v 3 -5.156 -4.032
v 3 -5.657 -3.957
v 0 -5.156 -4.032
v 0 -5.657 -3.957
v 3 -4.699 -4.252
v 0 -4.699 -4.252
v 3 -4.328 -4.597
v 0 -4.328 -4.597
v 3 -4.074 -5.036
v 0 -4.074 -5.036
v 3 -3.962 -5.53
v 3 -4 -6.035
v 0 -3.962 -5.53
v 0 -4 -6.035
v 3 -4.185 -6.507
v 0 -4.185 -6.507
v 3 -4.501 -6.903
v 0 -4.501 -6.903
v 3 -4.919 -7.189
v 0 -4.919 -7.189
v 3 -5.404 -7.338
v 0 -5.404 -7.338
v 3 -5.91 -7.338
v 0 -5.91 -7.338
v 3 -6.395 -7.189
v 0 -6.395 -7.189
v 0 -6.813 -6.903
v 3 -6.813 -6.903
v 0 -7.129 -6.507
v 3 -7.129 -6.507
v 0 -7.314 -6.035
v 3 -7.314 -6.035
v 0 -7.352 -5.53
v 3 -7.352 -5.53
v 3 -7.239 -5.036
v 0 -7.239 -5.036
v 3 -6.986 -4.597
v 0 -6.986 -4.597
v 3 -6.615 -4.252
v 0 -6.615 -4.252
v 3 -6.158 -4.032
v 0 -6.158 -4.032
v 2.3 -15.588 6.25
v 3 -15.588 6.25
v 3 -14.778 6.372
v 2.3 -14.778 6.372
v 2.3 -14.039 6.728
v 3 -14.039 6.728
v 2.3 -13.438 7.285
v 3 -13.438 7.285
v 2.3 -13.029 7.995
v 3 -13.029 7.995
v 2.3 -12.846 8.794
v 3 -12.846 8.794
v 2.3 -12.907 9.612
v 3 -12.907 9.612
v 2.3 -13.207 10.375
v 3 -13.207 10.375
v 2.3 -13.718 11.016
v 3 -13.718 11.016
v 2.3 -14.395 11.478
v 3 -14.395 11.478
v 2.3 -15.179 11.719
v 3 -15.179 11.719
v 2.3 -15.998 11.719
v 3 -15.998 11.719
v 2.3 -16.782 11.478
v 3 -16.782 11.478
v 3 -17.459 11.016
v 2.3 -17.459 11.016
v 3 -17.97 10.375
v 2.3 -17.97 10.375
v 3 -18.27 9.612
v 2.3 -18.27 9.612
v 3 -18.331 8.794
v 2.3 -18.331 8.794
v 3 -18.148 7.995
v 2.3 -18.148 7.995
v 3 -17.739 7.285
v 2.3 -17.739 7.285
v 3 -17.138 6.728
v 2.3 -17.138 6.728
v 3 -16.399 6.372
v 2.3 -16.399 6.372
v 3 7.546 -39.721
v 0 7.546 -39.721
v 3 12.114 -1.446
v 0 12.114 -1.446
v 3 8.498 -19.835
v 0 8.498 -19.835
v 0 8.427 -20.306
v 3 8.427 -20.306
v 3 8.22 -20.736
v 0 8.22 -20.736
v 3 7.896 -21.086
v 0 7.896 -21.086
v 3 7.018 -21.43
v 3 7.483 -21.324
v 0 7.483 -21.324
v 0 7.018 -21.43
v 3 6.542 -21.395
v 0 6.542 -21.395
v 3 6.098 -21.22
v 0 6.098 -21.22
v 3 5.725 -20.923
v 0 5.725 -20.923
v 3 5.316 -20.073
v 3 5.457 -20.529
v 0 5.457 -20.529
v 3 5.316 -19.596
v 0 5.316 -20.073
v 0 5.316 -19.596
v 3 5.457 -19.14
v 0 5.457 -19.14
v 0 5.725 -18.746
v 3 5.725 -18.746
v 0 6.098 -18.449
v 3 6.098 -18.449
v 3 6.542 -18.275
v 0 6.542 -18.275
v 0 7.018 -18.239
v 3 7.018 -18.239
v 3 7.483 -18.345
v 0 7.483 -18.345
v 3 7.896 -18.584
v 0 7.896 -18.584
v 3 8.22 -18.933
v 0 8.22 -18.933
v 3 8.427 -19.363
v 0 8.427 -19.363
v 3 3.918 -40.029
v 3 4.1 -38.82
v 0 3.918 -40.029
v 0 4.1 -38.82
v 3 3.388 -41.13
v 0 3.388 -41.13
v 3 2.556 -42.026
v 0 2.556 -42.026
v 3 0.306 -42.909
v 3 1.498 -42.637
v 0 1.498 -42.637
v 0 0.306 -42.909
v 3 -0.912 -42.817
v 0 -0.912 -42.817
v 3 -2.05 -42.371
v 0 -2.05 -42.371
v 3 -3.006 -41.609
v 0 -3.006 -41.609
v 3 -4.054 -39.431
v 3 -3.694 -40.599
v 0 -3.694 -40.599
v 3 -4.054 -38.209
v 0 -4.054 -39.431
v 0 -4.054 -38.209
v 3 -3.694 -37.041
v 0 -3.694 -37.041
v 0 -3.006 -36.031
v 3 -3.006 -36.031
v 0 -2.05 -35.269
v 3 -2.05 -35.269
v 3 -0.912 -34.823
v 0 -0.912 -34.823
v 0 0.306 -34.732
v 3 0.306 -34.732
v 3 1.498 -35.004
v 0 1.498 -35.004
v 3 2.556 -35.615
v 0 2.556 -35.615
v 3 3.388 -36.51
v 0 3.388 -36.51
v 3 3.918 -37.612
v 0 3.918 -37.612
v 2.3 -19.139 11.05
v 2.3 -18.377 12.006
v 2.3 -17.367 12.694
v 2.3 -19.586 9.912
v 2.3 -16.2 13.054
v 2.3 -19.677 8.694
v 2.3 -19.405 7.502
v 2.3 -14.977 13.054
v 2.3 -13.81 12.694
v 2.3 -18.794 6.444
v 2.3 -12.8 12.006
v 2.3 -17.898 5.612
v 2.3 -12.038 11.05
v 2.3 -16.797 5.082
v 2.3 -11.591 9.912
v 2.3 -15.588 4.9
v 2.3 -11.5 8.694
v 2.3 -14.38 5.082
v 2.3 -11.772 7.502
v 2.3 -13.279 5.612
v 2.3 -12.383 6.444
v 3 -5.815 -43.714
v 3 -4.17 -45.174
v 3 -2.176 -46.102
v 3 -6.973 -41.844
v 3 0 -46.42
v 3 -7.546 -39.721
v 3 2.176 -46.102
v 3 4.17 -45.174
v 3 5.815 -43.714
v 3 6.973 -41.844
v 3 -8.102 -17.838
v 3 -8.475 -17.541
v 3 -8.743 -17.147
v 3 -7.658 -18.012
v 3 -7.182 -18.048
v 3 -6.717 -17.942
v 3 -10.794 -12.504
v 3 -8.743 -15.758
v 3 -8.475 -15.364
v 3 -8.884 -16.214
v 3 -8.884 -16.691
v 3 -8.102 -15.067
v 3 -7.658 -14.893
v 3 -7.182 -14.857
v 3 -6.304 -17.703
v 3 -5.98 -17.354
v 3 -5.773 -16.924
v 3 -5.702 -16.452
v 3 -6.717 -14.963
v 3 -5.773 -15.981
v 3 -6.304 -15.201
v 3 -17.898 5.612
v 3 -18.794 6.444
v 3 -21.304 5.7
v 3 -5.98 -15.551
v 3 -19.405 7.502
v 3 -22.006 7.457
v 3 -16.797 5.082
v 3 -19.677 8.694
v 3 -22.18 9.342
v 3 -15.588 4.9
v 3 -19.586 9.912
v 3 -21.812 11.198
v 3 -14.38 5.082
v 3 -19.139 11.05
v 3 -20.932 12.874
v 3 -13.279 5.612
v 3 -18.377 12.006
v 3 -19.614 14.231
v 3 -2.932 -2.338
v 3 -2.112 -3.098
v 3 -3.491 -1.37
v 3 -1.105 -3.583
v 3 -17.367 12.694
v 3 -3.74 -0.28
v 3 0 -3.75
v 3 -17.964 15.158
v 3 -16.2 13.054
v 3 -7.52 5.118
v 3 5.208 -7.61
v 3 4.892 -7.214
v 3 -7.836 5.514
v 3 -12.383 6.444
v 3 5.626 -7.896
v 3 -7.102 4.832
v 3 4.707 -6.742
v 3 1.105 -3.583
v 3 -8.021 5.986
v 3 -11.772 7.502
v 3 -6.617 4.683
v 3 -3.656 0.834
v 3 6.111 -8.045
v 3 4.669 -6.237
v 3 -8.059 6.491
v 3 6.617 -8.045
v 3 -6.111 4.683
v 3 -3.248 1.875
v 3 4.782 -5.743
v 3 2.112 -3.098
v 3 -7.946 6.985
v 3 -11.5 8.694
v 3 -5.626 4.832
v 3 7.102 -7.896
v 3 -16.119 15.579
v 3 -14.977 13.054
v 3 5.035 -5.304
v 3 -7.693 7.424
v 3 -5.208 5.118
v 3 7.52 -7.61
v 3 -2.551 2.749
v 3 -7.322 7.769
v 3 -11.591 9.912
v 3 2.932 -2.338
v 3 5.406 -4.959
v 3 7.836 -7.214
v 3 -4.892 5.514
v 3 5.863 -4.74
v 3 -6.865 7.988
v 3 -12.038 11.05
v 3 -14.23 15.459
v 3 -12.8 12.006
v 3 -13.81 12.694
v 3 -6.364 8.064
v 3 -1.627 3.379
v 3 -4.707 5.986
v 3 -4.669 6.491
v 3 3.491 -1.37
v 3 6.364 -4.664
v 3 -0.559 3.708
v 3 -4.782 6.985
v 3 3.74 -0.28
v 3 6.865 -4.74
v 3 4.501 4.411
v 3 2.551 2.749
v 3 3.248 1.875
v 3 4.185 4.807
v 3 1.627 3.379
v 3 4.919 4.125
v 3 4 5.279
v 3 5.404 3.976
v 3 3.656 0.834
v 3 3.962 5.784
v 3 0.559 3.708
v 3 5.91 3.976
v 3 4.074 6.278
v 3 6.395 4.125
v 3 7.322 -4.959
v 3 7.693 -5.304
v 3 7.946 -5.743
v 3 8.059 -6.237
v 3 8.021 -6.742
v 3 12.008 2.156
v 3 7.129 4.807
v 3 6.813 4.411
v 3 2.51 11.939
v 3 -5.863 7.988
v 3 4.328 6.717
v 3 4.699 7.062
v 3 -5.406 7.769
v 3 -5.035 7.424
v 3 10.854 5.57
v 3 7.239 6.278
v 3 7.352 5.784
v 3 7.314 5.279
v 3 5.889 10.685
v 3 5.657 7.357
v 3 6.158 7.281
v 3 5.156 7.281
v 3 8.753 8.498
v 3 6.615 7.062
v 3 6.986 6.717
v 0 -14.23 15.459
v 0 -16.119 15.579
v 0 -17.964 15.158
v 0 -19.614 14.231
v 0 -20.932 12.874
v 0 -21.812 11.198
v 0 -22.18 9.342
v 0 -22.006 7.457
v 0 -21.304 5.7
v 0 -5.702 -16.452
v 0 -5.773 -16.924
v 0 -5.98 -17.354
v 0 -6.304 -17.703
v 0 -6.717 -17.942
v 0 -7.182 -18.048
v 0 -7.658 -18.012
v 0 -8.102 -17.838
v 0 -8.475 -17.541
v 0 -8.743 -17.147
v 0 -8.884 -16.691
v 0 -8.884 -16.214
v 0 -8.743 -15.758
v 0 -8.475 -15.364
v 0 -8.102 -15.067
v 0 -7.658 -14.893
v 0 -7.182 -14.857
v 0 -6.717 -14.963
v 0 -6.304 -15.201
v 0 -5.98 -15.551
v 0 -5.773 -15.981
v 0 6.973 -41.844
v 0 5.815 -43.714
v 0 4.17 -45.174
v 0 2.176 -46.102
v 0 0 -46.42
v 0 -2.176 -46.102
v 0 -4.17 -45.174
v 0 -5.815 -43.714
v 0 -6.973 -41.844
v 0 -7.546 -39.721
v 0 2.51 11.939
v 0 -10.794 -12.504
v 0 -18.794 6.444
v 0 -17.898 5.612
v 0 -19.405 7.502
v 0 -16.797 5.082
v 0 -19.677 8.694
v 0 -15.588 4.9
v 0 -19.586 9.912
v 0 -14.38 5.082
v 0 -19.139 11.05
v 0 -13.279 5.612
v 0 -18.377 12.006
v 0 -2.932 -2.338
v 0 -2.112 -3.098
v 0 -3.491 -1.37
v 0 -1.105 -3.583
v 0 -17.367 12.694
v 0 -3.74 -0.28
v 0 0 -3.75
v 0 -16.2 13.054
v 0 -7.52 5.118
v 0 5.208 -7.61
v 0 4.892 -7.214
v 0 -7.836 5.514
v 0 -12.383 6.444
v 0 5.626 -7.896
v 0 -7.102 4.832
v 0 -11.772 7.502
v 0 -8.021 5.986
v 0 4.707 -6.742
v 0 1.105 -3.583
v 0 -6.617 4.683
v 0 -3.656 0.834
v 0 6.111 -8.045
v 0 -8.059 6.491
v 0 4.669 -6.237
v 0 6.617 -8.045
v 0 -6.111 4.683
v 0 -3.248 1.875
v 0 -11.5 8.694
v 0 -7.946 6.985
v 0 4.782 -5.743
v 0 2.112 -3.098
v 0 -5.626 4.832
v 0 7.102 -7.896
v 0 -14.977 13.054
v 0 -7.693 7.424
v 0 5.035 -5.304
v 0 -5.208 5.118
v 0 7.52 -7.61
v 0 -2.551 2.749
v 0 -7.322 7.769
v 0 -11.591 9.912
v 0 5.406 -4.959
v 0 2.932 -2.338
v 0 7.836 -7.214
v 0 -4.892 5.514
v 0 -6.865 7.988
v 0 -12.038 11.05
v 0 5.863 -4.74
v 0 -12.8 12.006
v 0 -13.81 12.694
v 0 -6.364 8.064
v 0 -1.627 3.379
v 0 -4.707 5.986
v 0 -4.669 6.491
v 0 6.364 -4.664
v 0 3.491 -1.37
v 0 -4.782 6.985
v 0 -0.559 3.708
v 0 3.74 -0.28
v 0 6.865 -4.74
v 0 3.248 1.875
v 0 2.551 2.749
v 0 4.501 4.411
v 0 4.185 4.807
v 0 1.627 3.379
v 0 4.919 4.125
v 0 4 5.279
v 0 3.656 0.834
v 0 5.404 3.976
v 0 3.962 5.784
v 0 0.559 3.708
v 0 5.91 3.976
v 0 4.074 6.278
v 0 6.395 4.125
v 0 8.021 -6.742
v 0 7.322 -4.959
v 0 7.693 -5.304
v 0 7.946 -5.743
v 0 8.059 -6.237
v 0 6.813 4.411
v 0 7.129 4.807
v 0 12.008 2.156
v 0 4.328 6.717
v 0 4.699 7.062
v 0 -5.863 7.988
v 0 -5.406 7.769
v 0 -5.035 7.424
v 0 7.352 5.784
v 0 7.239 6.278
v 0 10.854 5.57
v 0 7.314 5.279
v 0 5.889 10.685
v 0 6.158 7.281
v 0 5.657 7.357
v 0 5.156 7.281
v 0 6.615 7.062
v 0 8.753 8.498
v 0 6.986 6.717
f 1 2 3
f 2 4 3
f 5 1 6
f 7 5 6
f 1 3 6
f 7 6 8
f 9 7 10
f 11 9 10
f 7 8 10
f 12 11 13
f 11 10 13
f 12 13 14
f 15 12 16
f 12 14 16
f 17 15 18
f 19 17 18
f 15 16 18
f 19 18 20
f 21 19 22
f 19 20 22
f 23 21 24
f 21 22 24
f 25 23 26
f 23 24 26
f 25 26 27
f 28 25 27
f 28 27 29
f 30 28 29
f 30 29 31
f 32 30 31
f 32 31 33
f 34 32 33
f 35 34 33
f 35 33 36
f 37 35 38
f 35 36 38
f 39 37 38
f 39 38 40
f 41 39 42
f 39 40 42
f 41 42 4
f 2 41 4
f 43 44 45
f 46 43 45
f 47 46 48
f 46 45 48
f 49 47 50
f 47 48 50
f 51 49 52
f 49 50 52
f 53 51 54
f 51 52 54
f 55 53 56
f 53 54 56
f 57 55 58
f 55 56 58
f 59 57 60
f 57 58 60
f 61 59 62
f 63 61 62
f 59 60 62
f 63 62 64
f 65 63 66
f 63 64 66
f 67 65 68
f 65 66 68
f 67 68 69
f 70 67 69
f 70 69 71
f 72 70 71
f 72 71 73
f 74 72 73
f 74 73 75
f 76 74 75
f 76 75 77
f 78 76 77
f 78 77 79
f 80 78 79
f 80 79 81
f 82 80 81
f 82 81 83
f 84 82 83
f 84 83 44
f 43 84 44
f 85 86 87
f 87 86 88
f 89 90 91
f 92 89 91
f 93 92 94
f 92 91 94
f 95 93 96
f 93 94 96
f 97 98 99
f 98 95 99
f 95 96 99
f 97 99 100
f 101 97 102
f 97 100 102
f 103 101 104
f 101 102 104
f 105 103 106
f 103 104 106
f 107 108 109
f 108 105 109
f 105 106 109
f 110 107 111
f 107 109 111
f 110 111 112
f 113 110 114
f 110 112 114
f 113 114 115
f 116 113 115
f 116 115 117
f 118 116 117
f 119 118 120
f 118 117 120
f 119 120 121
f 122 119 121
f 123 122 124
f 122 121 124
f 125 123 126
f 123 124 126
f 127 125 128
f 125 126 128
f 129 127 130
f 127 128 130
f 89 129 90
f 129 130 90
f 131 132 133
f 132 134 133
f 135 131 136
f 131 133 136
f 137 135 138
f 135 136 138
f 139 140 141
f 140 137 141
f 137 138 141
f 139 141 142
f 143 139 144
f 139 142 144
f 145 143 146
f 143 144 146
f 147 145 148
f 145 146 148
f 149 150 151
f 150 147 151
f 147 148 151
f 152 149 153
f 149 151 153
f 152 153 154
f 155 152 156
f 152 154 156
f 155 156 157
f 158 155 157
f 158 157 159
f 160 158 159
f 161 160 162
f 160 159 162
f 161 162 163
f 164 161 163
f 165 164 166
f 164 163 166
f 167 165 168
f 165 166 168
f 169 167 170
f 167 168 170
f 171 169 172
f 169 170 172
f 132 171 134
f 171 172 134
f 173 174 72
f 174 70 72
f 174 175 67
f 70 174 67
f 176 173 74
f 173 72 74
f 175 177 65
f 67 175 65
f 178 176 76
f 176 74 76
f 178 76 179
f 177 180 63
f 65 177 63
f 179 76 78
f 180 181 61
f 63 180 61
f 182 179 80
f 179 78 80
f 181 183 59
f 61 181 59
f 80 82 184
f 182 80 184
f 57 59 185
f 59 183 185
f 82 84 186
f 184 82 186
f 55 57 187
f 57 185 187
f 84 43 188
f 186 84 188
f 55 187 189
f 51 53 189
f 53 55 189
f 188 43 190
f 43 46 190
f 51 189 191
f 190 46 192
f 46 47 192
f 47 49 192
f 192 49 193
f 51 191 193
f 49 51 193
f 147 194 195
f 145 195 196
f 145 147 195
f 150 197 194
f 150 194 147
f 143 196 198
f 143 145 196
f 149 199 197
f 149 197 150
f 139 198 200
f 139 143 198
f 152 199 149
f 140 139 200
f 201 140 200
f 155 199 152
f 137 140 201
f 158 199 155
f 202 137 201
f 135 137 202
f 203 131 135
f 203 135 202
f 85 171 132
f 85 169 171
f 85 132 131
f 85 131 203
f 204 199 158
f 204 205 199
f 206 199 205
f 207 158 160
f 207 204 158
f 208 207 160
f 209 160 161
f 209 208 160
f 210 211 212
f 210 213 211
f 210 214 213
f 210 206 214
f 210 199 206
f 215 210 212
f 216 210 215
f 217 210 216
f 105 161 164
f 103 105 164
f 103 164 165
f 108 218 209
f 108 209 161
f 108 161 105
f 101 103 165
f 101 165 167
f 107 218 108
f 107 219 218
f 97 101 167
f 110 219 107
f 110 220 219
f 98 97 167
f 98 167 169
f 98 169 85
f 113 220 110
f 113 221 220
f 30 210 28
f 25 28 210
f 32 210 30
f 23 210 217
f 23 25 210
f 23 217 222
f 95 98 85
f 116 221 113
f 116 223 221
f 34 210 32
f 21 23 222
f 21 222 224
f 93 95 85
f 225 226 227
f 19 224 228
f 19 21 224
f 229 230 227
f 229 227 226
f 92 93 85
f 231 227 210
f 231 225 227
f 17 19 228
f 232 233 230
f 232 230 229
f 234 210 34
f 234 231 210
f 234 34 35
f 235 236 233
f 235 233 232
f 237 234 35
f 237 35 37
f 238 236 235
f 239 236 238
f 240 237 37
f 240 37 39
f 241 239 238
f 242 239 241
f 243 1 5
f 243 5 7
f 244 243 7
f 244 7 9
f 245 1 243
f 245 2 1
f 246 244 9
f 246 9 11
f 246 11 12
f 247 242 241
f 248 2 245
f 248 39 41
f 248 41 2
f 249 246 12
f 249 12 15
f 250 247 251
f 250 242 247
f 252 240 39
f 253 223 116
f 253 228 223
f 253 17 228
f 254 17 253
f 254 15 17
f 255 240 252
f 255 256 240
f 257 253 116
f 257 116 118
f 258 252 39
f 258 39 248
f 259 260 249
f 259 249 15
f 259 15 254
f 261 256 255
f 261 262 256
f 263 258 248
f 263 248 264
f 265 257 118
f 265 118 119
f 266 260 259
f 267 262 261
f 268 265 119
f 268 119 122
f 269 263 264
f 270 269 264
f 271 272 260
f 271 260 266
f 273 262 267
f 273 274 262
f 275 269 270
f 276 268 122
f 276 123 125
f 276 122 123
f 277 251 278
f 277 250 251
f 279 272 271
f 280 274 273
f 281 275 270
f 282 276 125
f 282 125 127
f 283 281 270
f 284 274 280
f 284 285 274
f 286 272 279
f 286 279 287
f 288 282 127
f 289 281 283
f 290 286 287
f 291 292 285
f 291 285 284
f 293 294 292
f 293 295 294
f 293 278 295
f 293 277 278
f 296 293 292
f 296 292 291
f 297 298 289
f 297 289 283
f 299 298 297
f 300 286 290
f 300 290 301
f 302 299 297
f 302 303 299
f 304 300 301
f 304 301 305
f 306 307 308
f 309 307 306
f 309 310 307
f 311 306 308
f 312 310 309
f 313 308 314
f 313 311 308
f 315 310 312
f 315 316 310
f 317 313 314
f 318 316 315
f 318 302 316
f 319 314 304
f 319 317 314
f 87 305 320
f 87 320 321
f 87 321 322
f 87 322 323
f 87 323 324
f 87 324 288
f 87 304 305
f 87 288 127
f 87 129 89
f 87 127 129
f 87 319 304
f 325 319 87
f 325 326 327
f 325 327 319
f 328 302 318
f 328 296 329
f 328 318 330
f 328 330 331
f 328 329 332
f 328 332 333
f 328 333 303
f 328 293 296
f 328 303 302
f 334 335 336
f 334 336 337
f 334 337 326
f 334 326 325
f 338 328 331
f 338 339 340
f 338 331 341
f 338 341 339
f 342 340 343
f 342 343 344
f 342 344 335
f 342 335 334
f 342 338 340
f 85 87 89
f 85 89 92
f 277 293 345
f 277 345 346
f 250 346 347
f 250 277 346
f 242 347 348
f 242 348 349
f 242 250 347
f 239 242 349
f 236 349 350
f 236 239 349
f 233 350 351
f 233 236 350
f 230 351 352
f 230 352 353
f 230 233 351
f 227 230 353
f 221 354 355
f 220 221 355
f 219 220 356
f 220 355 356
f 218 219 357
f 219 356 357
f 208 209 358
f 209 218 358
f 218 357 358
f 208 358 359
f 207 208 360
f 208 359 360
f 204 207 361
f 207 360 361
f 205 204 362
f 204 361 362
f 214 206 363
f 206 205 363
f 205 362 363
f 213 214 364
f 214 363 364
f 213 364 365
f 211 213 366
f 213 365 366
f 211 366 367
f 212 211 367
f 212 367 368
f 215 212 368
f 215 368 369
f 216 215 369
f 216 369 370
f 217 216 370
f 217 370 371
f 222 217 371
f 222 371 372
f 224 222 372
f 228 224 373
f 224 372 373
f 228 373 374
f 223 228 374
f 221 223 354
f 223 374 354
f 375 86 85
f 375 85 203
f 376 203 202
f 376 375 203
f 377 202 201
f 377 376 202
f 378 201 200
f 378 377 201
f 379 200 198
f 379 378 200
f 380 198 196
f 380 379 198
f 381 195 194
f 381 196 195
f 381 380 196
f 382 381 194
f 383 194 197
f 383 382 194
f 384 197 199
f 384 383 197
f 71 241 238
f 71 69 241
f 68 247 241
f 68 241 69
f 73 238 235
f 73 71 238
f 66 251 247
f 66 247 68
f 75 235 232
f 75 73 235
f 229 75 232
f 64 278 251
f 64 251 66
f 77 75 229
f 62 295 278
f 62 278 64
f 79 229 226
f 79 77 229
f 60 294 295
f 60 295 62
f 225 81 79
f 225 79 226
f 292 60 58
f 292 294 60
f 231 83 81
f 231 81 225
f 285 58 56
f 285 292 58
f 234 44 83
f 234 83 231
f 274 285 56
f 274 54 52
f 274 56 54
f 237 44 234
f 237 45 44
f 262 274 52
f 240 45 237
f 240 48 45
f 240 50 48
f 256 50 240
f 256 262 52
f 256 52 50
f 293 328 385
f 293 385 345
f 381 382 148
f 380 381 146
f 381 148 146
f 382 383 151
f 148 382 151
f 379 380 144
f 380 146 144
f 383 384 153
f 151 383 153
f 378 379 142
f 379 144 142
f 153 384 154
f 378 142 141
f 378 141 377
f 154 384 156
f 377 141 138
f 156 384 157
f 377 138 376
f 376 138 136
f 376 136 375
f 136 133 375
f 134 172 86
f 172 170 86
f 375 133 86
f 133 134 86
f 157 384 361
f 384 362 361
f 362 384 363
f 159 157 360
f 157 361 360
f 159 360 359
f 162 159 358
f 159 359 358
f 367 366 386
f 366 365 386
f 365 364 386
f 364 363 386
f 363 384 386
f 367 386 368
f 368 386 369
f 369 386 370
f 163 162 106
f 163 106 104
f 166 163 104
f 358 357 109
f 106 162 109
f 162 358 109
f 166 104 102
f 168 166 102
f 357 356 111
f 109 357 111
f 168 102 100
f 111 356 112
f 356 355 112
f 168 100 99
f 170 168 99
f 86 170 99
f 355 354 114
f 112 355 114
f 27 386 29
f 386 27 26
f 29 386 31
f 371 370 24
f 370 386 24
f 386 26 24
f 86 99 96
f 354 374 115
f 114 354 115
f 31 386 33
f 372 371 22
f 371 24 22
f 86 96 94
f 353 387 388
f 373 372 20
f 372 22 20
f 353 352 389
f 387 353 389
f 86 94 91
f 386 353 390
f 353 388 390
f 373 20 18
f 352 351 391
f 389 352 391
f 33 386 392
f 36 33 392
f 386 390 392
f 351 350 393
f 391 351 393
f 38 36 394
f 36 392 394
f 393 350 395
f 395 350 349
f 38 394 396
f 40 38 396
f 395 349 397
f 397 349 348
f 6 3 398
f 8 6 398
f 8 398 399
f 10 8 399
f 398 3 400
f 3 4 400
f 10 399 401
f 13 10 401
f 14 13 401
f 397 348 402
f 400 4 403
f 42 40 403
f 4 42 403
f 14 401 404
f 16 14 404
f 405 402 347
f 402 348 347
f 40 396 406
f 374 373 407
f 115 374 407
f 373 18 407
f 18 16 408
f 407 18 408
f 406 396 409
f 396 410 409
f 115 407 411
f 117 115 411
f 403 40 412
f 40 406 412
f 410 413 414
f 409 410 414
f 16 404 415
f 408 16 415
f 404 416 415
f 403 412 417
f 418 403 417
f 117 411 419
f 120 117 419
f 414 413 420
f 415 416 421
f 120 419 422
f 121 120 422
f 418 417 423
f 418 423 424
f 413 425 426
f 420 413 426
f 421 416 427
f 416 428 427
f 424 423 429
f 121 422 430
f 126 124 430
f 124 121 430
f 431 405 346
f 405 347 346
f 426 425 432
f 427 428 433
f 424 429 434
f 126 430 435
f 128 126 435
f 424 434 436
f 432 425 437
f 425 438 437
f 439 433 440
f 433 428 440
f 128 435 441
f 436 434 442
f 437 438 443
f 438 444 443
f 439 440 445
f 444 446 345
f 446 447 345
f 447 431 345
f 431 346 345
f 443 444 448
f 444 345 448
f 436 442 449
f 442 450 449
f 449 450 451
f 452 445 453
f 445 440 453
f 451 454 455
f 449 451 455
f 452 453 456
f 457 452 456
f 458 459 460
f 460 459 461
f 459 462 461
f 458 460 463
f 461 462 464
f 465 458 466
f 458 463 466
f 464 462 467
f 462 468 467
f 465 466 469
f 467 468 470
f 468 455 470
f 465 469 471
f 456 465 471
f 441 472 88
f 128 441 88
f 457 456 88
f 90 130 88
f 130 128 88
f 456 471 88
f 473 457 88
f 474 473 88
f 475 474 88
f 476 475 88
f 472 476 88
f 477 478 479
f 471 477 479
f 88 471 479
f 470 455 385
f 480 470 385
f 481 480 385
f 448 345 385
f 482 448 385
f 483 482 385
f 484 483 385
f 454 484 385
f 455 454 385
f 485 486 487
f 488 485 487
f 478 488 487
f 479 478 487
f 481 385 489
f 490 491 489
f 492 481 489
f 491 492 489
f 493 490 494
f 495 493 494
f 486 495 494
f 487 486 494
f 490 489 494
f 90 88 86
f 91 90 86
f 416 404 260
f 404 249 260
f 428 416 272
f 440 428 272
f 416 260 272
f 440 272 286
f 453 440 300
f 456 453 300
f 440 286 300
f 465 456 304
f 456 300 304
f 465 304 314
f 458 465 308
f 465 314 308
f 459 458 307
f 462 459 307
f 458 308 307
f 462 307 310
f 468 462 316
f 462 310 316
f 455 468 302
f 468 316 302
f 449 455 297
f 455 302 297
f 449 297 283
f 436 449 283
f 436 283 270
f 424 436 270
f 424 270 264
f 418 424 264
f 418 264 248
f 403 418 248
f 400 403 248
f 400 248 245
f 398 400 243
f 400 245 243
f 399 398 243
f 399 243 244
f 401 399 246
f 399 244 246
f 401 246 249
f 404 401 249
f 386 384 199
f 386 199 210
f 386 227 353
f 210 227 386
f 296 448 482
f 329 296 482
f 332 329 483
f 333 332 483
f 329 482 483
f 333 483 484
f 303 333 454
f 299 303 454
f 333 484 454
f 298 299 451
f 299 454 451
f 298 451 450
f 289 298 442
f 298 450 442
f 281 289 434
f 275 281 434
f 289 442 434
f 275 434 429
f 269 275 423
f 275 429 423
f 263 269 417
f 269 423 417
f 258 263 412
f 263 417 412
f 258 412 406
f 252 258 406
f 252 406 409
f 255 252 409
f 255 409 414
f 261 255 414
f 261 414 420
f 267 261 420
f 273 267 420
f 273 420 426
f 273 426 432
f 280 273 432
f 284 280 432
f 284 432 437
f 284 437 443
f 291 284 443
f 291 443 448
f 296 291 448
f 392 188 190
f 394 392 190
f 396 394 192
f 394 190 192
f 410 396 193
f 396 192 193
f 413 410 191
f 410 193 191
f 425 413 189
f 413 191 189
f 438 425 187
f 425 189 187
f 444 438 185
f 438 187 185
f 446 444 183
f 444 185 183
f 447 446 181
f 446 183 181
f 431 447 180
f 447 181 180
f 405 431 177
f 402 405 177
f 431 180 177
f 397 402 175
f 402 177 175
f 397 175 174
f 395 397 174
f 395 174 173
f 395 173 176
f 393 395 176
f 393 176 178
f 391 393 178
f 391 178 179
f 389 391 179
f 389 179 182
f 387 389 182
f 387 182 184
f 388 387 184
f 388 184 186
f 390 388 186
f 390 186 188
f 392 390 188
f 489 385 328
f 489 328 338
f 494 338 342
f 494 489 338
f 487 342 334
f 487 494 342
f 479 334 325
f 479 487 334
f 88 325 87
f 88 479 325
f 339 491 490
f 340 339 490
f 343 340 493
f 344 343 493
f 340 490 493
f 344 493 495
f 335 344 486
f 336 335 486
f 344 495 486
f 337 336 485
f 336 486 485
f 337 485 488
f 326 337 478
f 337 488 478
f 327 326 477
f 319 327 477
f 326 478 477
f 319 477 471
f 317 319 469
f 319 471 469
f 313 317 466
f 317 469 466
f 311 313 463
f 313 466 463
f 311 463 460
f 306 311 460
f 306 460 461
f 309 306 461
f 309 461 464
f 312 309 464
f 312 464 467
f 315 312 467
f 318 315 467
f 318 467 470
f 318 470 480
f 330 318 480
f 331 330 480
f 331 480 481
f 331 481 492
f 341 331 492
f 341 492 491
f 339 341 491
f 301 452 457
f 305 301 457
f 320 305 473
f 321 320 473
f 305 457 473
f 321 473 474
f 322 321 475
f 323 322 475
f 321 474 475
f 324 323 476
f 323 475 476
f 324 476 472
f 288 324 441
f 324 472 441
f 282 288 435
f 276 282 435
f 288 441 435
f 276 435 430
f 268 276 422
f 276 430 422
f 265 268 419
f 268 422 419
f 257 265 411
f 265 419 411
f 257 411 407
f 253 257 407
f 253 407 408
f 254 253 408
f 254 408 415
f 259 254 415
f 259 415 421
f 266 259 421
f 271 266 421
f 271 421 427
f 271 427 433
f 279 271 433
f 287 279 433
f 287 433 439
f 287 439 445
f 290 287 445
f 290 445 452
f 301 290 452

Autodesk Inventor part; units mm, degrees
ref_plane "YZ Plane" through (0, 0, 0) normal (1, 0, 0) x (0, 1, 0)
ref_plane "XZ Plane" through (0, 0, 0) normal (0, 1, 0) x (-1, 0, 0)
ref_plane "XY Plane" through (0, 0, 0) normal (0, 0, 1) x (1, 0, 0)
sketch "Эскиз1" plane through (0, 0, 0) normal (1, 0, 0) x (0, 1, 0)
  circle A0 centre (35.2311, -22.6062) radius 9.3
  circle A1 centre (0, -38.8201) radius 6.1 construction
  circle A2 centre (0, 0) radius 4.85 construction
  circle A3 centre (35.8147, -49.5529) radius 3.55
  line L0 (6.0968, -38.6237) -> (4.8475, 0.1562) construction
  line L1 (-4.8475, 0.1562) -> (-6.0968, -38.6237) construction
  line L2 (0, 0) -> (0, -38.8201) construction
  circle A4 centre (0, -38.8201) radius 4.1
  circle A5 centre (0, 0) radius 2.5
  circle A6 centre (0, -38.8201) radius 15 construction
  circle A7 centre (0, 0) radius 14 construction
  circle A8 centre (0, -38.8201) radius 7.6
  circle A9 centre (0, 0) radius 7 construction
  line L3 (7.5465, -39.7207) -> (12.114, -1.4456)
  line L4 (-7.5465, -39.7207) -> (-12.114, -1.4456)
  circle A10 centre (0, 0) radius 8.8 construction
  circle A11 centre (0, 0) radius 12.2
  circle A12 centre (6.8983, -19.8347) radius 1.6
  circle A13 centre (-7.3019, -16.4524) radius 1.6
  point P0 (-7, 0)
  point P1 (-7.5465, -39.7207)
  point P2 (-12.114, -1.4456)
  dimension "d0" = 18.6
  dimension "d1" = 12.2
  dimension "d2" = 9.7
  dimension "d3" = 7.1
  dimension "d8" = 38.8201
  dimension "d13" = 38.8
  dimension "d14" = 38.8
  dimension "d23" = 8.2
  dimension "d24" = 5
  dimension "d25" = 30
  dimension "d26" = 28
  dimension "d28" = 14
  dimension "d31" = 17.6
  dimension "d32" = 3.4
  dimension "d56" = 3.5
  dimension "d58" = 3.2
  dimension "d59" = 3
  dimension "d60" = 21
  dimension "d61" = 3.2
  dimension "d62" = 3
  dimension "d63" = 18
extrude "Выдавливание4" add sketch "Эскиз1" along normal blind 3 contours A8 | A8 L4 A11 L3 | A11
sketch "Эскиз4" plane through (0, 0, 0) normal (-1, 0, 0) x (0, 0, 1)
  circle A0 centre (-38.8201, 0) radius 4.1 construction
  arc A1 (-1.4456, -12.114) -> (-1.4456, 12.114) centre (0, 0) ccw construction
  line L0 (-39.7207, 7.5465) -> (-1.4456, 12.114) construction
  arc A2 (-39.7207, 7.5465) -> (-39.7207, -7.5465) centre (-38.8201, 0) ccw construction
  line L1 (-1.4456, -12.114) -> (-39.7207, -7.5465) construction
  line L2 (0, 0) -> (0, 12.2) construction
  arc A3 (-1.4456, -12.114) -> (-1.4456, 12.114) centre (0, 0) ccw construction
  line L3 (0, 0) -> (12.2, 0) construction
  circle A4 centre (5.6569, 5.6569) radius 1.7
  line L4 (5.6569, 5.6569) -> (0, 0) construction
  circle A5 centre (-6.364, 6.364) radius 1.7
  line L5 (0, 0) -> (-6.364, 6.364) construction
  circle A6 centre (-5.6569, -5.6569) radius 1.7
  circle A7 centre (6.364, -6.364) radius 1.7
  dimension "d65" = 45
  dimension "d66" = 3.4
  dimension "d67" = 3.4
  dimension "d68" = 45
  dimension "d69" = 16
  dimension "d70" = 18
extrude "Выдавливание5" cut sketch "Эскиз4" against normal blind 3
sketch "Эскиз5" plane through (3, 0, 0) normal (1, 0, 0) x (0, 0, -1)
  circle A0 centre (0, 0) radius 3.75
  dimension "d38" = 7.5
extrude "Выдавливание6" cut sketch "Эскиз5" against normal blind 3
sketch "Эскиз6" plane through (3, 0, 0) normal (1, 0, 0) x (0, 0, -1)
  circle A0 centre (0, -18) radius 2
  circle A1 centre (0, 0) radius 3.75 construction
  circle A2 centre (-5.6569, 5.6569) radius 1.7 construction
  circle A3 centre (38.8201, 0) radius 4.1 construction
  line L0 (39.7207, 7.5465) -> (1.4456, 12.114) construction
  arc A4 (1.4456, 12.114) -> (1.4456, -12.114) centre (0, 0) ccw construction
  line L1 (1.4456, -12.114) -> (39.7207, -7.5465) construction
  arc A5 (39.7207, -7.5465) -> (39.7207, 7.5465) centre (38.8201, 0) ccw construction
  line L2 (0, 0) -> (0, -26.6004) construction
  circle A6 centre (0, 0) radius 14 construction
  line L3 (-10.8605, -5.5578) -> (-3.5608, -19.8222)
  arc A7 (0, -14) -> (-3.5608, -19.8222) centre (0, -18) ccw construction
  line L4 (2.8284, -20.8284) -> (12.911, -10.7458)
  line L5 (1.4456, -12.114) -> (39.7207, -7.5465) construction
  arc A8 (2.8284, -20.8284) -> (0, -14) centre (0, -18) ccw construction
  arc A9 (-3.5608, -19.8222) -> (2.8284, -20.8284) centre (0, -18) ccw
  line L6 (-10.8605, -5.5578) -> (-10.1465, -5.5578)
  line L7 (-10.1465, -5.5578) -> (-6.8136, -9.4237)
  line L8 (-6.8136, -9.4237) -> (5.1237, -10.512)
  line L9 (5.1237, -10.512) -> (12.911, -10.7458)
  dimension "d42" = 28
  dimension "d41" = 4
  dimension "d43" = 18
  dimension "d44" = 8
  dimension "d45" = 45
extrude "Выдавливание7" [suppressed]
sketch "Эскиз7" plane through (3, 0, 0) normal (1, 0, 0) x (0, 0, -1)
  line L0 (0, 0) -> (0, -29.4139) construction
  circle A0 centre (-9, -15.5885) radius 2.75
  line L1 (-9, -15.5885) -> (0, 0) construction
  circle A1 centre (0, 0) radius 14 construction
  circle A2 centre (0, 0) radius 18 construction
  arc A3 (-5.7, -21.3042) -> (-15.4588, -14.2305) centre (-9, -15.5885) ccw construction
  circle A4 centre (0, 0) radius 3.75 construction
  circle A5 centre (-5.6569, 5.6569) radius 1.7 construction
  circle A6 centre (38.8201, 0) radius 4.1 construction
  line L2 (39.7207, 7.5465) -> (1.4456, 12.114) construction
  arc A7 (1.4456, 12.114) -> (1.4456, -12.114) centre (0, 0) ccw projected
  line L3 (1.4456, -12.114) -> (39.7207, -7.5465) projected
  arc A8 (39.7207, -7.5465) -> (39.7207, 7.5465) centre (38.8201, 0) ccw construction
  line L4 (-11.939, 2.5102) -> (-15.4588, -14.2305)
  line L5 (-5.7, -21.3042) -> (12.5035, -10.7945)
  line L6 (1.4456, -12.114) -> (39.7207, -7.5465) construction
  arc A9 (-15.4588, -14.2305) -> (-5.7, -21.3042) centre (-9, -15.5885) ccw
  circle A10 centre (-9, -15.5885) radius 4.1
  point P0 (12.5035, -10.7945)
  dimension "d48" = 5.5
  dimension "d49" = 330
  dimension "d50" = 28
  dimension "d51" = 4
  dimension "d53" = 30
  dimension "d71" = 8.2
  dimension "d76" = 2.5
extrude "Выдавливание8" add sketch "Эскиз7" against normal up to surface (3 mm away) contours A7 L3 L5 A9 L4 | A10
extrude "Выдавливание9" cut sketch "Эскиз7" against normal blind 3 contours A10
extrude "Выдавливание10" add sketch "Эскиз7" against normal blind 0.7 contours A10
properties part number "_3DПЕЧАТЬ"
